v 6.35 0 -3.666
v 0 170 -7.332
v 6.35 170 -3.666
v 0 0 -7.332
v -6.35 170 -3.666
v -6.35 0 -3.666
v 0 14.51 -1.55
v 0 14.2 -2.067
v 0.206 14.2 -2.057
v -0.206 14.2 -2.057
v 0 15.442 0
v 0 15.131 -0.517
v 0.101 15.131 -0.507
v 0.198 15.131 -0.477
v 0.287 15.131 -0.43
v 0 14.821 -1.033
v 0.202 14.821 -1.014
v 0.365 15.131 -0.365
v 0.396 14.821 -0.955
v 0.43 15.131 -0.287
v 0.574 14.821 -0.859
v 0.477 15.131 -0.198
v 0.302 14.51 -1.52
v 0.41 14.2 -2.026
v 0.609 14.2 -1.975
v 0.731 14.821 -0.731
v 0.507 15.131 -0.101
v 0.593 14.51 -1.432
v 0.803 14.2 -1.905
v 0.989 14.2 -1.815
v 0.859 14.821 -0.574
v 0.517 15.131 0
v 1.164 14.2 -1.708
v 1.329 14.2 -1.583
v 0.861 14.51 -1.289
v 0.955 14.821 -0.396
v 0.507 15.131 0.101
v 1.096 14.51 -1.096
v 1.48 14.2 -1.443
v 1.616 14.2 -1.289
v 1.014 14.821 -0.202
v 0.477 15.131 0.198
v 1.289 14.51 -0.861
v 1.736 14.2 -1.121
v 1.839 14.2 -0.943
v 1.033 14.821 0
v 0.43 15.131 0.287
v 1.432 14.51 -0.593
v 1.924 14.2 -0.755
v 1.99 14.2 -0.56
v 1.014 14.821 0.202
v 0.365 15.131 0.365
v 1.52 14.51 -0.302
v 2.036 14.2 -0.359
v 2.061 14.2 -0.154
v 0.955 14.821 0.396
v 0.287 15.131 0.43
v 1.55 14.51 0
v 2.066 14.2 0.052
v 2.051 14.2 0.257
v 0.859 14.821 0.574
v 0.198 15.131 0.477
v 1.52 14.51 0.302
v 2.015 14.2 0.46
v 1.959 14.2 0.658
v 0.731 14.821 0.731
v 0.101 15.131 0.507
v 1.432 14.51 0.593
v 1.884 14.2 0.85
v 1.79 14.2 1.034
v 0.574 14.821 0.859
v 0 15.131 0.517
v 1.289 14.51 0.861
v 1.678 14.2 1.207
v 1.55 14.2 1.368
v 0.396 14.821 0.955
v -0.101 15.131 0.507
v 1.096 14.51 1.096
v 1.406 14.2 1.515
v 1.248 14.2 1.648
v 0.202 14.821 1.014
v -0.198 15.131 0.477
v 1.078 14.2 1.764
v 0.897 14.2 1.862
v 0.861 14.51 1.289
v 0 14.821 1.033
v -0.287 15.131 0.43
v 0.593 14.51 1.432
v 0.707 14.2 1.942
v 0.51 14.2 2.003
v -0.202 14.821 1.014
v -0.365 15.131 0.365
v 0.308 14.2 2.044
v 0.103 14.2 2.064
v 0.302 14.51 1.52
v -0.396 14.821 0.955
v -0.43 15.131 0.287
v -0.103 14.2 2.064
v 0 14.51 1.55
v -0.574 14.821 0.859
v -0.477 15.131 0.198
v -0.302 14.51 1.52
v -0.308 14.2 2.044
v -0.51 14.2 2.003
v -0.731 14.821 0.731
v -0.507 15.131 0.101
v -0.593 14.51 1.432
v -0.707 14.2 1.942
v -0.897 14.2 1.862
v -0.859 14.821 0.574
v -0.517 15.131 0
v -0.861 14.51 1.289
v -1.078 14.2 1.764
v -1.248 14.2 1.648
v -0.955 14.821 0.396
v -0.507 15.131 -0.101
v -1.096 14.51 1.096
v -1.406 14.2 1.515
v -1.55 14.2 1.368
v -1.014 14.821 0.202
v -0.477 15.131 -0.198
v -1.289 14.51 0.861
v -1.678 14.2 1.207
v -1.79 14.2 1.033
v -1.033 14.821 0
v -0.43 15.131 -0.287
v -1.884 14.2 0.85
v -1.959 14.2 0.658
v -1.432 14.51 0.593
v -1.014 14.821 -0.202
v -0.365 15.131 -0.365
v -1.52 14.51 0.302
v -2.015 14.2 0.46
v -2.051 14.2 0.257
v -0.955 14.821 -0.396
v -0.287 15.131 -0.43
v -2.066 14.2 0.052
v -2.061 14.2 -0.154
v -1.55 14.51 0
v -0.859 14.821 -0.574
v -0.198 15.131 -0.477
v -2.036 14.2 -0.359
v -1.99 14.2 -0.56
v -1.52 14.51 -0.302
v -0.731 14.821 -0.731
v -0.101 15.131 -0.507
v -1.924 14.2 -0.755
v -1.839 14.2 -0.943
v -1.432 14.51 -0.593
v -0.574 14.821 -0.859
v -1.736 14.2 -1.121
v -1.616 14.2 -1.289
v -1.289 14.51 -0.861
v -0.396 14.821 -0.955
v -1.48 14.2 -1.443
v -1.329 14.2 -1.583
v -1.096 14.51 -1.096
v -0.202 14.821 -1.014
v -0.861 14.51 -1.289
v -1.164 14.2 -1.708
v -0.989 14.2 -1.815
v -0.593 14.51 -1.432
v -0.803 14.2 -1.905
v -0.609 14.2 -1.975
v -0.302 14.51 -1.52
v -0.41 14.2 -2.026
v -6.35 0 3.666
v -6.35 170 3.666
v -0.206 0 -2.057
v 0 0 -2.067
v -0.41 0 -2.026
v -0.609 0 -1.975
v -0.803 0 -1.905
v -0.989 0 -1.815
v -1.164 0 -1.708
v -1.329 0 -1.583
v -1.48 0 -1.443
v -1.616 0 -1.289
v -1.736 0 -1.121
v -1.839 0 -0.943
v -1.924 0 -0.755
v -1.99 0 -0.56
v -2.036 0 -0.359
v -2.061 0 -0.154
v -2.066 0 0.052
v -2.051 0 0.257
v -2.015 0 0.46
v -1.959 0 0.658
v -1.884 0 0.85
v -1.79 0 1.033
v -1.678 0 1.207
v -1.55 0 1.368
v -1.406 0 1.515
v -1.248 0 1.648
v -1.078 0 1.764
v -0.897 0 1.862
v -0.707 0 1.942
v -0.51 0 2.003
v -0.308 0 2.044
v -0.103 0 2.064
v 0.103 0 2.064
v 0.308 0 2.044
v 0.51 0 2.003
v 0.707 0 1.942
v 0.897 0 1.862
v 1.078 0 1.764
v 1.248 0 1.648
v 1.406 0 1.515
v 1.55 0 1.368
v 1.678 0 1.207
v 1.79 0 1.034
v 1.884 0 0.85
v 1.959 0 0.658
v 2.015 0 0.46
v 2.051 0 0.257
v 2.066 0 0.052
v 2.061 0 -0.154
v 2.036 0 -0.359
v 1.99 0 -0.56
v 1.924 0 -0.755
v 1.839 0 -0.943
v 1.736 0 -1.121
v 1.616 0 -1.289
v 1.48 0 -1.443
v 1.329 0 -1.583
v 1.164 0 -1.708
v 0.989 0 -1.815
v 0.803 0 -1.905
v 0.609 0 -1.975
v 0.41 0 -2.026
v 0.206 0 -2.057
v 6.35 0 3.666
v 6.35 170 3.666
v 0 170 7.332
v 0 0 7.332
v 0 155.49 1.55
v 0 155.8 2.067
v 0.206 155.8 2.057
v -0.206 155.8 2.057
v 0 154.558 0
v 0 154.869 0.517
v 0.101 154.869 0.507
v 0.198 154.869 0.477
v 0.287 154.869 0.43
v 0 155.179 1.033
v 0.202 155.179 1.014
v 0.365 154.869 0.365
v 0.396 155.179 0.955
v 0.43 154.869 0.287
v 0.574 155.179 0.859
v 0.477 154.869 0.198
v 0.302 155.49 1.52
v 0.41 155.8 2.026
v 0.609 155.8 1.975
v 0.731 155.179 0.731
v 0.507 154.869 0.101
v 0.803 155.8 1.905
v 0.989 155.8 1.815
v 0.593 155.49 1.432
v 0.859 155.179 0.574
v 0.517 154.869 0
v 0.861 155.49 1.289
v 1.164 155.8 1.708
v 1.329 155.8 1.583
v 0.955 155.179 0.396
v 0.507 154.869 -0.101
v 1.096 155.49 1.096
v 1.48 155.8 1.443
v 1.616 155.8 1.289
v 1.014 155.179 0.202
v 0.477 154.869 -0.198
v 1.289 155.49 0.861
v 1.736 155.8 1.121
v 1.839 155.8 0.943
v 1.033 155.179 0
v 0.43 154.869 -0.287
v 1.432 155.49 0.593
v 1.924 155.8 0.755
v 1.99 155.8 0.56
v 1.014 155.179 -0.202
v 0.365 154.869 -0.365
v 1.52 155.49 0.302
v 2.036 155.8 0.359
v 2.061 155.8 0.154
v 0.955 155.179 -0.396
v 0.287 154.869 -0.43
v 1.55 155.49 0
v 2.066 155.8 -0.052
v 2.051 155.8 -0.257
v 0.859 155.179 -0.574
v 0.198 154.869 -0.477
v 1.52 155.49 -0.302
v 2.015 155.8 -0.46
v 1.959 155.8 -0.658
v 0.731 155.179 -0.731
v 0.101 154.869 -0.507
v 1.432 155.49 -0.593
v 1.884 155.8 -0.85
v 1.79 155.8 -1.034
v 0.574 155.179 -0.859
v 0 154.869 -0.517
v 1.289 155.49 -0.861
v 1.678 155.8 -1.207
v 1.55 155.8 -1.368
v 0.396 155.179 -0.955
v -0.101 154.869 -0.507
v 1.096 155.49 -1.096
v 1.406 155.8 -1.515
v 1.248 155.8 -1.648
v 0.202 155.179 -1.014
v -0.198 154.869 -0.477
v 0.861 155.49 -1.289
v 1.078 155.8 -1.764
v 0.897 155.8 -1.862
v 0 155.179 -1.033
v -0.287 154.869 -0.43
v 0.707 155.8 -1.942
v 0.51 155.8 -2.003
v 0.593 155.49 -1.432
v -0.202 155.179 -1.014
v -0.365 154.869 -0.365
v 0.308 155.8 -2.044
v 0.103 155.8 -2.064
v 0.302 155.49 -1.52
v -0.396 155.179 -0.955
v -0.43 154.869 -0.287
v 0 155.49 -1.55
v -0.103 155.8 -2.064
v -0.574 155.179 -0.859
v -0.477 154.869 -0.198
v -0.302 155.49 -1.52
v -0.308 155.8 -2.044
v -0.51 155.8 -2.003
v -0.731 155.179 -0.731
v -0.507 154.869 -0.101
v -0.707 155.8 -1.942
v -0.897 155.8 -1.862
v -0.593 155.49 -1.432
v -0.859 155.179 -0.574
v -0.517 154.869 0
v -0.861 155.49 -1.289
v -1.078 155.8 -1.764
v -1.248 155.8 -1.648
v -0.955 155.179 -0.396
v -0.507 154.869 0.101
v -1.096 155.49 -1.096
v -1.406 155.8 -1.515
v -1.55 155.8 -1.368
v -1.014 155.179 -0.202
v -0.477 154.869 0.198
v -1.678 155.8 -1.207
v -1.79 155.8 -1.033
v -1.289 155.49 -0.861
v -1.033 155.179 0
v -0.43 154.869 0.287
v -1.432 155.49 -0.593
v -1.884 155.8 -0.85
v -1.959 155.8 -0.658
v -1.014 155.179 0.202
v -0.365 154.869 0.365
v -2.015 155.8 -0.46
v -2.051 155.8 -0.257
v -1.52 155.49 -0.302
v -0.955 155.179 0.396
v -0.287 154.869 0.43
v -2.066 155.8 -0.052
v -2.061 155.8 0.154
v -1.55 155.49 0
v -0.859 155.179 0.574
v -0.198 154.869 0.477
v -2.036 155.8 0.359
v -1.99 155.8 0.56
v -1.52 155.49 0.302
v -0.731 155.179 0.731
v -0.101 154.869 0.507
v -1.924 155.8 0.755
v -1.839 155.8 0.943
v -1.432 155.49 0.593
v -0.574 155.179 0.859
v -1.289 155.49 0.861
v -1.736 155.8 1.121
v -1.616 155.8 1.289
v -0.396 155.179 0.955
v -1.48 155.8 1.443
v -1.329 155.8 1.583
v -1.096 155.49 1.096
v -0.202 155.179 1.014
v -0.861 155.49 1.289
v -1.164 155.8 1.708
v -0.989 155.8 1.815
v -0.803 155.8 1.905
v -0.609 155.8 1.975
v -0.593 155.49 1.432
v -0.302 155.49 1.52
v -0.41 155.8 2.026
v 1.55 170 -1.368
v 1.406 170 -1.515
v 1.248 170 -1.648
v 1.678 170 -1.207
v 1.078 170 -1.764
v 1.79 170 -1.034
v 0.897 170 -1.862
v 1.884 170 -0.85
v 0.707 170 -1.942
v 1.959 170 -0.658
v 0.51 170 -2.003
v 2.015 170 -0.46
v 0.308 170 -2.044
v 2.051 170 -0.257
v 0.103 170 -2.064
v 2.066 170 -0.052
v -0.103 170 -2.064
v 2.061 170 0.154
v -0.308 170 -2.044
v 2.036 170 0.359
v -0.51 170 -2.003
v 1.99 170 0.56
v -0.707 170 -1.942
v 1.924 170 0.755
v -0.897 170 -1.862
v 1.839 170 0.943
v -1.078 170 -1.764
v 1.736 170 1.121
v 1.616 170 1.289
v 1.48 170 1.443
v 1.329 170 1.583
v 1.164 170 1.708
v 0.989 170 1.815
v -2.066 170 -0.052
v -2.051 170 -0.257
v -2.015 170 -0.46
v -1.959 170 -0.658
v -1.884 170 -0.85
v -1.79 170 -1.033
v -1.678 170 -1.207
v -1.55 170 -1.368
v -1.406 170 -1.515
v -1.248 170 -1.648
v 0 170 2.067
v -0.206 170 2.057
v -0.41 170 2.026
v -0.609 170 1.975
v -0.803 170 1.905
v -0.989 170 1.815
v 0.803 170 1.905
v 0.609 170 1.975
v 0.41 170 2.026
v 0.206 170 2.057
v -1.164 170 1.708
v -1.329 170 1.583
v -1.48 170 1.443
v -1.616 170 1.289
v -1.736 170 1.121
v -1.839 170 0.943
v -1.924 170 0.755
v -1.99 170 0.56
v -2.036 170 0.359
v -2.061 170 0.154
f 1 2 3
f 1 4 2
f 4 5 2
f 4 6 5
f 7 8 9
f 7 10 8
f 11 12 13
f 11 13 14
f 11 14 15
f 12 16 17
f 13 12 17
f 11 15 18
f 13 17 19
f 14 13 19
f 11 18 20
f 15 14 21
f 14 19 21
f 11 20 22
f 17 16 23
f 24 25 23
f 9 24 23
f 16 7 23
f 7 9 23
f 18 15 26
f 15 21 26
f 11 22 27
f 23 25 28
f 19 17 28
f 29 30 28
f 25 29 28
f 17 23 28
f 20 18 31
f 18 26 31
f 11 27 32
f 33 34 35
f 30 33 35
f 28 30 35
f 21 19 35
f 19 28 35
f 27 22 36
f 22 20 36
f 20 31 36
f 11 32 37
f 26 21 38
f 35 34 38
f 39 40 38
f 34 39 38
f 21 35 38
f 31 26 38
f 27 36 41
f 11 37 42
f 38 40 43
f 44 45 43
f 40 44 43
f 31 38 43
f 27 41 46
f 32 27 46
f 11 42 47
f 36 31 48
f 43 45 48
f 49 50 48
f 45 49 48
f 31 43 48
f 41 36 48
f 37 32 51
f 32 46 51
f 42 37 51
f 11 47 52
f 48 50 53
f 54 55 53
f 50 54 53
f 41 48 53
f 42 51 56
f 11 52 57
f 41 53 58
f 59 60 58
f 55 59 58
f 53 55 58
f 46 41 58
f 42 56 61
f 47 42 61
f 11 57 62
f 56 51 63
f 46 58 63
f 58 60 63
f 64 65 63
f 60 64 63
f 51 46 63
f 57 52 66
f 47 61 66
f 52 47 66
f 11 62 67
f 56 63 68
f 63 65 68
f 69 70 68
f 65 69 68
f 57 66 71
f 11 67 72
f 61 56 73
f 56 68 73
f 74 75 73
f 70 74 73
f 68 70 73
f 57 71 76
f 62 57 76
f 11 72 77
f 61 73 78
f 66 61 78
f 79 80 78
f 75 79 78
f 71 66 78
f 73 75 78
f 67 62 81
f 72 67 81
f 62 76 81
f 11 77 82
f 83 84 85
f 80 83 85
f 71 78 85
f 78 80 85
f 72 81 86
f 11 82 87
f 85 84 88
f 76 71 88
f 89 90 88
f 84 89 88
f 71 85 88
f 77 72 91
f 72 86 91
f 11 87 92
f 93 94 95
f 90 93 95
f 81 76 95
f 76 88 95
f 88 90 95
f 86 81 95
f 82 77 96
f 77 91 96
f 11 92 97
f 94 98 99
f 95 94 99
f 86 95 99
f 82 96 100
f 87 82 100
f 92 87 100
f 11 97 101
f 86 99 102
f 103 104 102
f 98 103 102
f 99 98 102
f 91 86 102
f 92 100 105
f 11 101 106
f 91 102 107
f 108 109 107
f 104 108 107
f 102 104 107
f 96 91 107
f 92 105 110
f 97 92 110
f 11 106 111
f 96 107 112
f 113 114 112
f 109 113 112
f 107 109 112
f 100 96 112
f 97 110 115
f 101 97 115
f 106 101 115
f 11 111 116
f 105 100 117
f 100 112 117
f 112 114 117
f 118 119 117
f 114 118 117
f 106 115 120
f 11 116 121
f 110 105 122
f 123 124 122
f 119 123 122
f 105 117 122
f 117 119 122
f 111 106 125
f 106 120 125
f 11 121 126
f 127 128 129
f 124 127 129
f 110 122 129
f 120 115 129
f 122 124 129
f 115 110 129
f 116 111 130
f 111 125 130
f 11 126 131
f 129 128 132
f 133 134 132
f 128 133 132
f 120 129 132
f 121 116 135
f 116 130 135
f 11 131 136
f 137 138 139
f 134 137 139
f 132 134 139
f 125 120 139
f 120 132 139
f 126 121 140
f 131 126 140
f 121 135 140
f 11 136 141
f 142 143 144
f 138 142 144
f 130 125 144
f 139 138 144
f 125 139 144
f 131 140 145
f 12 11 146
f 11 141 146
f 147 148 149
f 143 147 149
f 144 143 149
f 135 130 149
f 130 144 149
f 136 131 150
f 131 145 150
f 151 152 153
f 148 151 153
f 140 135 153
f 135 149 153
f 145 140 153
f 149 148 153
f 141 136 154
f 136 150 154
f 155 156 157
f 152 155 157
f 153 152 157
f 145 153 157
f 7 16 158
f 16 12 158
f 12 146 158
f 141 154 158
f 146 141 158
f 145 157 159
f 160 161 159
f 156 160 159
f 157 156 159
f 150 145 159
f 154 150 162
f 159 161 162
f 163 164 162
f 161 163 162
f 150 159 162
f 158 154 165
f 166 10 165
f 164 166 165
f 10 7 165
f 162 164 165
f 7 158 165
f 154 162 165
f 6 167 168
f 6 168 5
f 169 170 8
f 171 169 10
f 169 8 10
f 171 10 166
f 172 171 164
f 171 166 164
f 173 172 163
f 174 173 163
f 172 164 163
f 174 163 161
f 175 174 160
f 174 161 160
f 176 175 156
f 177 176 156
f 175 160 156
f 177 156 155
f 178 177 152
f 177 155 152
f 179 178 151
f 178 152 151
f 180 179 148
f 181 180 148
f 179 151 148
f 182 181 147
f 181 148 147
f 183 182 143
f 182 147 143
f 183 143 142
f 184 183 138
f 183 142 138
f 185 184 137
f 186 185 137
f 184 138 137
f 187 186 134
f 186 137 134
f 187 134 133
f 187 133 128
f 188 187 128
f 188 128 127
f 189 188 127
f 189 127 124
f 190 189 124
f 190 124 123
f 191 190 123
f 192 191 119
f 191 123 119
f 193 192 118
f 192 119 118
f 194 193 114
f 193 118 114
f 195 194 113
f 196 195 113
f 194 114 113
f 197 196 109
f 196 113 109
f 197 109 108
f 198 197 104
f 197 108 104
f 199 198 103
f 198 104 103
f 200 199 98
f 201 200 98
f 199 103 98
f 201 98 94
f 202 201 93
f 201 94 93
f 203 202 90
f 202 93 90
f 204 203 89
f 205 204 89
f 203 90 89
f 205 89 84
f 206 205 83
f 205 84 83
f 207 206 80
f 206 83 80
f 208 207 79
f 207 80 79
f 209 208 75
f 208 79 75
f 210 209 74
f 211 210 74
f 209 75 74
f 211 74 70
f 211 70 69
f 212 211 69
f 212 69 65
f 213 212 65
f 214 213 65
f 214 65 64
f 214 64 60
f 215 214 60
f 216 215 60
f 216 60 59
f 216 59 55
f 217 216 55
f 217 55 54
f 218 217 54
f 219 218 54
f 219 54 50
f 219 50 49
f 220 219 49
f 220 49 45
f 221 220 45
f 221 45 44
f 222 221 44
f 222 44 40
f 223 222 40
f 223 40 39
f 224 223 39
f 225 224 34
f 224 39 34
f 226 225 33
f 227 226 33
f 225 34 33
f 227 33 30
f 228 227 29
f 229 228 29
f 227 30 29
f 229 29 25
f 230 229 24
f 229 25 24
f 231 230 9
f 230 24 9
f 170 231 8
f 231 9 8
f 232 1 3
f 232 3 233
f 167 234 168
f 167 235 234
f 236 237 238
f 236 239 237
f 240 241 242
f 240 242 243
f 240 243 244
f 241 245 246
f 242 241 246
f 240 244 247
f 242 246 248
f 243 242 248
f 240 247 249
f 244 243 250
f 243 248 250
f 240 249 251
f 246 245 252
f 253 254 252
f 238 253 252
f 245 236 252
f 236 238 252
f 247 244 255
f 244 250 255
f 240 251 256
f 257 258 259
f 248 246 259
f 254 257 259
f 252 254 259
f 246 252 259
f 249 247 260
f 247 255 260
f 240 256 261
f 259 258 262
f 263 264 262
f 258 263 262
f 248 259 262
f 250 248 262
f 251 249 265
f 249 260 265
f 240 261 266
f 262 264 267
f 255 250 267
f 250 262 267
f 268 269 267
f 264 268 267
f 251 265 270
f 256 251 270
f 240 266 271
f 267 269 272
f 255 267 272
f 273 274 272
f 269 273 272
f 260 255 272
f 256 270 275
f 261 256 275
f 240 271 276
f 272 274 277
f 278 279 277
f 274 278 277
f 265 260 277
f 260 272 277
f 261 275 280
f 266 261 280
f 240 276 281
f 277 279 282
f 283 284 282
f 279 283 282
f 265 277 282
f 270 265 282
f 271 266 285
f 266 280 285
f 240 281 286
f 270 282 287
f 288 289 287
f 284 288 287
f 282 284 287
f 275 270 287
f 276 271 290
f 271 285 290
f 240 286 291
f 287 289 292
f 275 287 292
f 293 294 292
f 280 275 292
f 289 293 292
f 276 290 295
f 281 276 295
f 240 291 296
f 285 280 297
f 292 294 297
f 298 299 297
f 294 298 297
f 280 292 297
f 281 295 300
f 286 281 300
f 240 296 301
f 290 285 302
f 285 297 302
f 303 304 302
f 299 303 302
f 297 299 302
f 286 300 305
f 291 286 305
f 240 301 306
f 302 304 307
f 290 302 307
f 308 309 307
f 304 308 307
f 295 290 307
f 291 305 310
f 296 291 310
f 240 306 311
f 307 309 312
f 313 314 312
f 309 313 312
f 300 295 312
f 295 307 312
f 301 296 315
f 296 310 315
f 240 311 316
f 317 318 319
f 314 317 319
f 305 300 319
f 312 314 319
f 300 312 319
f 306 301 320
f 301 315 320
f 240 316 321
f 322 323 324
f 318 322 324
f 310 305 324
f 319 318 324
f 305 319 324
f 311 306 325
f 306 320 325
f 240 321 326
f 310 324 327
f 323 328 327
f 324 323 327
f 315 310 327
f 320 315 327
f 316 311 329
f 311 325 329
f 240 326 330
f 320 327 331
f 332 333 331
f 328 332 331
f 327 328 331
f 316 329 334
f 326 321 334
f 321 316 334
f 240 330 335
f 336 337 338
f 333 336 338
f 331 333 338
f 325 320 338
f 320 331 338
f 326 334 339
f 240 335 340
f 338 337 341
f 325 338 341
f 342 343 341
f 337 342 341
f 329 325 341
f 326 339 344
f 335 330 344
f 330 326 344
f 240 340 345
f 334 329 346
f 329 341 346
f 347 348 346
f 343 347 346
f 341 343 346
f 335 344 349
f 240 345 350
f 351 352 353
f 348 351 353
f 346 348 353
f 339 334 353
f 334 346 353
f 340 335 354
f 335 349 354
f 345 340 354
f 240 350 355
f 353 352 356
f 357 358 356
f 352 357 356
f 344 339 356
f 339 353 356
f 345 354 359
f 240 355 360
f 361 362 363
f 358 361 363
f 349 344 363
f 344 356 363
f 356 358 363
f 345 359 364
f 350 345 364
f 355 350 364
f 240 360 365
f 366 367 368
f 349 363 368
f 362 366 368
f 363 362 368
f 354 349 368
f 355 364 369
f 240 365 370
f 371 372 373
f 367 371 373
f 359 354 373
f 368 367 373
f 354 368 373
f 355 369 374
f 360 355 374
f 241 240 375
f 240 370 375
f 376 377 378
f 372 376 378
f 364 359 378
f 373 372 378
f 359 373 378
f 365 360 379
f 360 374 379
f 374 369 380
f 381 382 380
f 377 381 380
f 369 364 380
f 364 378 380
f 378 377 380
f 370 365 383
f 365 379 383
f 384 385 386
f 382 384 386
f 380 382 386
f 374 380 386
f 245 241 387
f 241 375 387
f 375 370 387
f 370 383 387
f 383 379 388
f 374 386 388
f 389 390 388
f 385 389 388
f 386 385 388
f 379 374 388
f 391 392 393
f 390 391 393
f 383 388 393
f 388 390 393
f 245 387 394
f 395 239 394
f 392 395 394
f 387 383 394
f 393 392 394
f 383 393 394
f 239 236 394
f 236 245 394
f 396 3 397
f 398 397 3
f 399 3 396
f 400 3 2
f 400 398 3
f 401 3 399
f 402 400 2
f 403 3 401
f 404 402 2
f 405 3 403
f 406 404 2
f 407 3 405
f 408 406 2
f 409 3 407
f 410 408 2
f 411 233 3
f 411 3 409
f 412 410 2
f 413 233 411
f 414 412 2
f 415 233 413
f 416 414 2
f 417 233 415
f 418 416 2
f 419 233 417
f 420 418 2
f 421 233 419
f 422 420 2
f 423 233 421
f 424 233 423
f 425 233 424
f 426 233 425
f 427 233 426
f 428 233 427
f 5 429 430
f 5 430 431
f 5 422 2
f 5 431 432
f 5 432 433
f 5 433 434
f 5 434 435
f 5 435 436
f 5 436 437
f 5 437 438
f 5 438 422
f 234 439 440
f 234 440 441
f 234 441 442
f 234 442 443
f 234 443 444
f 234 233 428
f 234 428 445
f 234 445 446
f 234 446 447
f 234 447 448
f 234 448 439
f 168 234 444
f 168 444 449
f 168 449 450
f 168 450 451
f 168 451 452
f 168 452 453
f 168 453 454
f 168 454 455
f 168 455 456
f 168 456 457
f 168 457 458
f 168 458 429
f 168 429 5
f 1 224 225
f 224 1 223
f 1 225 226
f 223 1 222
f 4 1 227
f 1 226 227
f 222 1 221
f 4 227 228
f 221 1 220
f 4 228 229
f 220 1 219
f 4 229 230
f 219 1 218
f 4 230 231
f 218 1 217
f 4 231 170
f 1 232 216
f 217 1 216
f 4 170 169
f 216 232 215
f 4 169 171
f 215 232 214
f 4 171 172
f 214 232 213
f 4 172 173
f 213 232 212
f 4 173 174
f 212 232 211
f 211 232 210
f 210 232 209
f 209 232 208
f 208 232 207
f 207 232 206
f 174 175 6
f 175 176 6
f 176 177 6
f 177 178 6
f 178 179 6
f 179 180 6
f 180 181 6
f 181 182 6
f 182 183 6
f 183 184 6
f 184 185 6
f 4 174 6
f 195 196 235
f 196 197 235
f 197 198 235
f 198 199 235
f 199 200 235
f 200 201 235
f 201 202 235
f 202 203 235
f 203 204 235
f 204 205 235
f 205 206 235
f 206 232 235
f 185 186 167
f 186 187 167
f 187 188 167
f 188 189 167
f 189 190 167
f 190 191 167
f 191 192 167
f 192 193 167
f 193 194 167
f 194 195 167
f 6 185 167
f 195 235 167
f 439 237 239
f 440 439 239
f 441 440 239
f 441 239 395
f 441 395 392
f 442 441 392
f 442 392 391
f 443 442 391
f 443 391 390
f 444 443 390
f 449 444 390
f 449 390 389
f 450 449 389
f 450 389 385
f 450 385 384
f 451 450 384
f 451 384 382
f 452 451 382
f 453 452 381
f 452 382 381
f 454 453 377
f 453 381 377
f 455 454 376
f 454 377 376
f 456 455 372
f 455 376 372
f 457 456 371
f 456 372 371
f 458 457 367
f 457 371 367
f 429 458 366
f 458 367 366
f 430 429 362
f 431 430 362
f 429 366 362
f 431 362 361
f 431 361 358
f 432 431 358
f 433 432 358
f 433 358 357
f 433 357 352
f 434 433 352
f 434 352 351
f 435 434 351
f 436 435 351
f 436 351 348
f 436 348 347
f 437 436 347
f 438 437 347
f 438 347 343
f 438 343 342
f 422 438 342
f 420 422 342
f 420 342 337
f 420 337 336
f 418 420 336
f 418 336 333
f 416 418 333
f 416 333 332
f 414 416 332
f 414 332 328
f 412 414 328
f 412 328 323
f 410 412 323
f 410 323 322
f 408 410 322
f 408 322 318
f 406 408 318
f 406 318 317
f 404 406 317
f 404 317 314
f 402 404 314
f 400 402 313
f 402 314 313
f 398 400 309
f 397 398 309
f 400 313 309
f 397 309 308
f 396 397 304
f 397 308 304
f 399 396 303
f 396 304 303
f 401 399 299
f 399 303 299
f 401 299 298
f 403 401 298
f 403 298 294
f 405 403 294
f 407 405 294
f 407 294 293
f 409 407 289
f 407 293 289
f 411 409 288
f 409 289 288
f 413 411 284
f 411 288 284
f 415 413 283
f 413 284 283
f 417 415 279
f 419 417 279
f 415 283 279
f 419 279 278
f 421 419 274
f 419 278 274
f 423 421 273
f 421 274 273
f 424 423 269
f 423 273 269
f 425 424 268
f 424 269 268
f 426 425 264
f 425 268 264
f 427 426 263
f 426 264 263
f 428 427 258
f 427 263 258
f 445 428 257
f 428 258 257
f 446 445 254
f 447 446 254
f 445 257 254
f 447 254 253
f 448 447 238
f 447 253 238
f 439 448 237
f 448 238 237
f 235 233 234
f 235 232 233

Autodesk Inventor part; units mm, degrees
ref_plane "YZ Plane" through (0, 0, 0) normal (1, 0, 0) x (0, 1, 0)
ref_plane "XZ Plane" through (0, 0, 0) normal (0, 1, 0) x (-1, 0, 0)
ref_plane "XY Plane" through (0, 0, 0) normal (0, 0, 1) x (1, 0, 0)
sketch "Sketch1" plane through (0, 0, 0) normal (0, 1, 0) x (-1, 0, 0)
  line L0 (0, -7.3323) -> (-6.35, -3.6662)
  line L1 (-6.35, -3.6662) -> (-6.35, 3.6662)
  line L2 (-6.35, 3.6662) -> (0, 7.3323)
  line L3 (0, 7.3323) -> (6.35, 3.6662)
  line L4 (6.35, 3.6662) -> (6.35, -3.6662)
  line L5 (6.35, -3.6662) -> (0, -7.3323)
  point P0 (0, 0)
  dimension "d19" = 12.7
extrude "Extrusion1" add sketch "Sketch1" along normal blind 170
sketch "Sketch5" plane through (0, 170, 0) normal (0, 1, 0) x (1, 0, 0)
  point P0 (0, 0)
  point P1 (0, 0)
hole "Hole3" at (0, 170, 0) direction (0, -1, 0) diameter 4.134 depth 14.2 tip angle 118 thread size "M5x0.8" class "6H" standard "ANSI Metric M Profile"
sketch "Sketch6" plane through (0, 0, 0) normal (0, -1, 0) x (1, 0, 0)
  point P0 (0, 0)
  point P1 (0, 0)
hole "Hole4" at (0, 0, 0) direction (0, 1, 0) diameter 4.134 depth 14.2 tip angle 118 thread size "M5x0.8" class "6H" standard "ANSI Metric M Profile"
properties part number "Adapter Standoff"
